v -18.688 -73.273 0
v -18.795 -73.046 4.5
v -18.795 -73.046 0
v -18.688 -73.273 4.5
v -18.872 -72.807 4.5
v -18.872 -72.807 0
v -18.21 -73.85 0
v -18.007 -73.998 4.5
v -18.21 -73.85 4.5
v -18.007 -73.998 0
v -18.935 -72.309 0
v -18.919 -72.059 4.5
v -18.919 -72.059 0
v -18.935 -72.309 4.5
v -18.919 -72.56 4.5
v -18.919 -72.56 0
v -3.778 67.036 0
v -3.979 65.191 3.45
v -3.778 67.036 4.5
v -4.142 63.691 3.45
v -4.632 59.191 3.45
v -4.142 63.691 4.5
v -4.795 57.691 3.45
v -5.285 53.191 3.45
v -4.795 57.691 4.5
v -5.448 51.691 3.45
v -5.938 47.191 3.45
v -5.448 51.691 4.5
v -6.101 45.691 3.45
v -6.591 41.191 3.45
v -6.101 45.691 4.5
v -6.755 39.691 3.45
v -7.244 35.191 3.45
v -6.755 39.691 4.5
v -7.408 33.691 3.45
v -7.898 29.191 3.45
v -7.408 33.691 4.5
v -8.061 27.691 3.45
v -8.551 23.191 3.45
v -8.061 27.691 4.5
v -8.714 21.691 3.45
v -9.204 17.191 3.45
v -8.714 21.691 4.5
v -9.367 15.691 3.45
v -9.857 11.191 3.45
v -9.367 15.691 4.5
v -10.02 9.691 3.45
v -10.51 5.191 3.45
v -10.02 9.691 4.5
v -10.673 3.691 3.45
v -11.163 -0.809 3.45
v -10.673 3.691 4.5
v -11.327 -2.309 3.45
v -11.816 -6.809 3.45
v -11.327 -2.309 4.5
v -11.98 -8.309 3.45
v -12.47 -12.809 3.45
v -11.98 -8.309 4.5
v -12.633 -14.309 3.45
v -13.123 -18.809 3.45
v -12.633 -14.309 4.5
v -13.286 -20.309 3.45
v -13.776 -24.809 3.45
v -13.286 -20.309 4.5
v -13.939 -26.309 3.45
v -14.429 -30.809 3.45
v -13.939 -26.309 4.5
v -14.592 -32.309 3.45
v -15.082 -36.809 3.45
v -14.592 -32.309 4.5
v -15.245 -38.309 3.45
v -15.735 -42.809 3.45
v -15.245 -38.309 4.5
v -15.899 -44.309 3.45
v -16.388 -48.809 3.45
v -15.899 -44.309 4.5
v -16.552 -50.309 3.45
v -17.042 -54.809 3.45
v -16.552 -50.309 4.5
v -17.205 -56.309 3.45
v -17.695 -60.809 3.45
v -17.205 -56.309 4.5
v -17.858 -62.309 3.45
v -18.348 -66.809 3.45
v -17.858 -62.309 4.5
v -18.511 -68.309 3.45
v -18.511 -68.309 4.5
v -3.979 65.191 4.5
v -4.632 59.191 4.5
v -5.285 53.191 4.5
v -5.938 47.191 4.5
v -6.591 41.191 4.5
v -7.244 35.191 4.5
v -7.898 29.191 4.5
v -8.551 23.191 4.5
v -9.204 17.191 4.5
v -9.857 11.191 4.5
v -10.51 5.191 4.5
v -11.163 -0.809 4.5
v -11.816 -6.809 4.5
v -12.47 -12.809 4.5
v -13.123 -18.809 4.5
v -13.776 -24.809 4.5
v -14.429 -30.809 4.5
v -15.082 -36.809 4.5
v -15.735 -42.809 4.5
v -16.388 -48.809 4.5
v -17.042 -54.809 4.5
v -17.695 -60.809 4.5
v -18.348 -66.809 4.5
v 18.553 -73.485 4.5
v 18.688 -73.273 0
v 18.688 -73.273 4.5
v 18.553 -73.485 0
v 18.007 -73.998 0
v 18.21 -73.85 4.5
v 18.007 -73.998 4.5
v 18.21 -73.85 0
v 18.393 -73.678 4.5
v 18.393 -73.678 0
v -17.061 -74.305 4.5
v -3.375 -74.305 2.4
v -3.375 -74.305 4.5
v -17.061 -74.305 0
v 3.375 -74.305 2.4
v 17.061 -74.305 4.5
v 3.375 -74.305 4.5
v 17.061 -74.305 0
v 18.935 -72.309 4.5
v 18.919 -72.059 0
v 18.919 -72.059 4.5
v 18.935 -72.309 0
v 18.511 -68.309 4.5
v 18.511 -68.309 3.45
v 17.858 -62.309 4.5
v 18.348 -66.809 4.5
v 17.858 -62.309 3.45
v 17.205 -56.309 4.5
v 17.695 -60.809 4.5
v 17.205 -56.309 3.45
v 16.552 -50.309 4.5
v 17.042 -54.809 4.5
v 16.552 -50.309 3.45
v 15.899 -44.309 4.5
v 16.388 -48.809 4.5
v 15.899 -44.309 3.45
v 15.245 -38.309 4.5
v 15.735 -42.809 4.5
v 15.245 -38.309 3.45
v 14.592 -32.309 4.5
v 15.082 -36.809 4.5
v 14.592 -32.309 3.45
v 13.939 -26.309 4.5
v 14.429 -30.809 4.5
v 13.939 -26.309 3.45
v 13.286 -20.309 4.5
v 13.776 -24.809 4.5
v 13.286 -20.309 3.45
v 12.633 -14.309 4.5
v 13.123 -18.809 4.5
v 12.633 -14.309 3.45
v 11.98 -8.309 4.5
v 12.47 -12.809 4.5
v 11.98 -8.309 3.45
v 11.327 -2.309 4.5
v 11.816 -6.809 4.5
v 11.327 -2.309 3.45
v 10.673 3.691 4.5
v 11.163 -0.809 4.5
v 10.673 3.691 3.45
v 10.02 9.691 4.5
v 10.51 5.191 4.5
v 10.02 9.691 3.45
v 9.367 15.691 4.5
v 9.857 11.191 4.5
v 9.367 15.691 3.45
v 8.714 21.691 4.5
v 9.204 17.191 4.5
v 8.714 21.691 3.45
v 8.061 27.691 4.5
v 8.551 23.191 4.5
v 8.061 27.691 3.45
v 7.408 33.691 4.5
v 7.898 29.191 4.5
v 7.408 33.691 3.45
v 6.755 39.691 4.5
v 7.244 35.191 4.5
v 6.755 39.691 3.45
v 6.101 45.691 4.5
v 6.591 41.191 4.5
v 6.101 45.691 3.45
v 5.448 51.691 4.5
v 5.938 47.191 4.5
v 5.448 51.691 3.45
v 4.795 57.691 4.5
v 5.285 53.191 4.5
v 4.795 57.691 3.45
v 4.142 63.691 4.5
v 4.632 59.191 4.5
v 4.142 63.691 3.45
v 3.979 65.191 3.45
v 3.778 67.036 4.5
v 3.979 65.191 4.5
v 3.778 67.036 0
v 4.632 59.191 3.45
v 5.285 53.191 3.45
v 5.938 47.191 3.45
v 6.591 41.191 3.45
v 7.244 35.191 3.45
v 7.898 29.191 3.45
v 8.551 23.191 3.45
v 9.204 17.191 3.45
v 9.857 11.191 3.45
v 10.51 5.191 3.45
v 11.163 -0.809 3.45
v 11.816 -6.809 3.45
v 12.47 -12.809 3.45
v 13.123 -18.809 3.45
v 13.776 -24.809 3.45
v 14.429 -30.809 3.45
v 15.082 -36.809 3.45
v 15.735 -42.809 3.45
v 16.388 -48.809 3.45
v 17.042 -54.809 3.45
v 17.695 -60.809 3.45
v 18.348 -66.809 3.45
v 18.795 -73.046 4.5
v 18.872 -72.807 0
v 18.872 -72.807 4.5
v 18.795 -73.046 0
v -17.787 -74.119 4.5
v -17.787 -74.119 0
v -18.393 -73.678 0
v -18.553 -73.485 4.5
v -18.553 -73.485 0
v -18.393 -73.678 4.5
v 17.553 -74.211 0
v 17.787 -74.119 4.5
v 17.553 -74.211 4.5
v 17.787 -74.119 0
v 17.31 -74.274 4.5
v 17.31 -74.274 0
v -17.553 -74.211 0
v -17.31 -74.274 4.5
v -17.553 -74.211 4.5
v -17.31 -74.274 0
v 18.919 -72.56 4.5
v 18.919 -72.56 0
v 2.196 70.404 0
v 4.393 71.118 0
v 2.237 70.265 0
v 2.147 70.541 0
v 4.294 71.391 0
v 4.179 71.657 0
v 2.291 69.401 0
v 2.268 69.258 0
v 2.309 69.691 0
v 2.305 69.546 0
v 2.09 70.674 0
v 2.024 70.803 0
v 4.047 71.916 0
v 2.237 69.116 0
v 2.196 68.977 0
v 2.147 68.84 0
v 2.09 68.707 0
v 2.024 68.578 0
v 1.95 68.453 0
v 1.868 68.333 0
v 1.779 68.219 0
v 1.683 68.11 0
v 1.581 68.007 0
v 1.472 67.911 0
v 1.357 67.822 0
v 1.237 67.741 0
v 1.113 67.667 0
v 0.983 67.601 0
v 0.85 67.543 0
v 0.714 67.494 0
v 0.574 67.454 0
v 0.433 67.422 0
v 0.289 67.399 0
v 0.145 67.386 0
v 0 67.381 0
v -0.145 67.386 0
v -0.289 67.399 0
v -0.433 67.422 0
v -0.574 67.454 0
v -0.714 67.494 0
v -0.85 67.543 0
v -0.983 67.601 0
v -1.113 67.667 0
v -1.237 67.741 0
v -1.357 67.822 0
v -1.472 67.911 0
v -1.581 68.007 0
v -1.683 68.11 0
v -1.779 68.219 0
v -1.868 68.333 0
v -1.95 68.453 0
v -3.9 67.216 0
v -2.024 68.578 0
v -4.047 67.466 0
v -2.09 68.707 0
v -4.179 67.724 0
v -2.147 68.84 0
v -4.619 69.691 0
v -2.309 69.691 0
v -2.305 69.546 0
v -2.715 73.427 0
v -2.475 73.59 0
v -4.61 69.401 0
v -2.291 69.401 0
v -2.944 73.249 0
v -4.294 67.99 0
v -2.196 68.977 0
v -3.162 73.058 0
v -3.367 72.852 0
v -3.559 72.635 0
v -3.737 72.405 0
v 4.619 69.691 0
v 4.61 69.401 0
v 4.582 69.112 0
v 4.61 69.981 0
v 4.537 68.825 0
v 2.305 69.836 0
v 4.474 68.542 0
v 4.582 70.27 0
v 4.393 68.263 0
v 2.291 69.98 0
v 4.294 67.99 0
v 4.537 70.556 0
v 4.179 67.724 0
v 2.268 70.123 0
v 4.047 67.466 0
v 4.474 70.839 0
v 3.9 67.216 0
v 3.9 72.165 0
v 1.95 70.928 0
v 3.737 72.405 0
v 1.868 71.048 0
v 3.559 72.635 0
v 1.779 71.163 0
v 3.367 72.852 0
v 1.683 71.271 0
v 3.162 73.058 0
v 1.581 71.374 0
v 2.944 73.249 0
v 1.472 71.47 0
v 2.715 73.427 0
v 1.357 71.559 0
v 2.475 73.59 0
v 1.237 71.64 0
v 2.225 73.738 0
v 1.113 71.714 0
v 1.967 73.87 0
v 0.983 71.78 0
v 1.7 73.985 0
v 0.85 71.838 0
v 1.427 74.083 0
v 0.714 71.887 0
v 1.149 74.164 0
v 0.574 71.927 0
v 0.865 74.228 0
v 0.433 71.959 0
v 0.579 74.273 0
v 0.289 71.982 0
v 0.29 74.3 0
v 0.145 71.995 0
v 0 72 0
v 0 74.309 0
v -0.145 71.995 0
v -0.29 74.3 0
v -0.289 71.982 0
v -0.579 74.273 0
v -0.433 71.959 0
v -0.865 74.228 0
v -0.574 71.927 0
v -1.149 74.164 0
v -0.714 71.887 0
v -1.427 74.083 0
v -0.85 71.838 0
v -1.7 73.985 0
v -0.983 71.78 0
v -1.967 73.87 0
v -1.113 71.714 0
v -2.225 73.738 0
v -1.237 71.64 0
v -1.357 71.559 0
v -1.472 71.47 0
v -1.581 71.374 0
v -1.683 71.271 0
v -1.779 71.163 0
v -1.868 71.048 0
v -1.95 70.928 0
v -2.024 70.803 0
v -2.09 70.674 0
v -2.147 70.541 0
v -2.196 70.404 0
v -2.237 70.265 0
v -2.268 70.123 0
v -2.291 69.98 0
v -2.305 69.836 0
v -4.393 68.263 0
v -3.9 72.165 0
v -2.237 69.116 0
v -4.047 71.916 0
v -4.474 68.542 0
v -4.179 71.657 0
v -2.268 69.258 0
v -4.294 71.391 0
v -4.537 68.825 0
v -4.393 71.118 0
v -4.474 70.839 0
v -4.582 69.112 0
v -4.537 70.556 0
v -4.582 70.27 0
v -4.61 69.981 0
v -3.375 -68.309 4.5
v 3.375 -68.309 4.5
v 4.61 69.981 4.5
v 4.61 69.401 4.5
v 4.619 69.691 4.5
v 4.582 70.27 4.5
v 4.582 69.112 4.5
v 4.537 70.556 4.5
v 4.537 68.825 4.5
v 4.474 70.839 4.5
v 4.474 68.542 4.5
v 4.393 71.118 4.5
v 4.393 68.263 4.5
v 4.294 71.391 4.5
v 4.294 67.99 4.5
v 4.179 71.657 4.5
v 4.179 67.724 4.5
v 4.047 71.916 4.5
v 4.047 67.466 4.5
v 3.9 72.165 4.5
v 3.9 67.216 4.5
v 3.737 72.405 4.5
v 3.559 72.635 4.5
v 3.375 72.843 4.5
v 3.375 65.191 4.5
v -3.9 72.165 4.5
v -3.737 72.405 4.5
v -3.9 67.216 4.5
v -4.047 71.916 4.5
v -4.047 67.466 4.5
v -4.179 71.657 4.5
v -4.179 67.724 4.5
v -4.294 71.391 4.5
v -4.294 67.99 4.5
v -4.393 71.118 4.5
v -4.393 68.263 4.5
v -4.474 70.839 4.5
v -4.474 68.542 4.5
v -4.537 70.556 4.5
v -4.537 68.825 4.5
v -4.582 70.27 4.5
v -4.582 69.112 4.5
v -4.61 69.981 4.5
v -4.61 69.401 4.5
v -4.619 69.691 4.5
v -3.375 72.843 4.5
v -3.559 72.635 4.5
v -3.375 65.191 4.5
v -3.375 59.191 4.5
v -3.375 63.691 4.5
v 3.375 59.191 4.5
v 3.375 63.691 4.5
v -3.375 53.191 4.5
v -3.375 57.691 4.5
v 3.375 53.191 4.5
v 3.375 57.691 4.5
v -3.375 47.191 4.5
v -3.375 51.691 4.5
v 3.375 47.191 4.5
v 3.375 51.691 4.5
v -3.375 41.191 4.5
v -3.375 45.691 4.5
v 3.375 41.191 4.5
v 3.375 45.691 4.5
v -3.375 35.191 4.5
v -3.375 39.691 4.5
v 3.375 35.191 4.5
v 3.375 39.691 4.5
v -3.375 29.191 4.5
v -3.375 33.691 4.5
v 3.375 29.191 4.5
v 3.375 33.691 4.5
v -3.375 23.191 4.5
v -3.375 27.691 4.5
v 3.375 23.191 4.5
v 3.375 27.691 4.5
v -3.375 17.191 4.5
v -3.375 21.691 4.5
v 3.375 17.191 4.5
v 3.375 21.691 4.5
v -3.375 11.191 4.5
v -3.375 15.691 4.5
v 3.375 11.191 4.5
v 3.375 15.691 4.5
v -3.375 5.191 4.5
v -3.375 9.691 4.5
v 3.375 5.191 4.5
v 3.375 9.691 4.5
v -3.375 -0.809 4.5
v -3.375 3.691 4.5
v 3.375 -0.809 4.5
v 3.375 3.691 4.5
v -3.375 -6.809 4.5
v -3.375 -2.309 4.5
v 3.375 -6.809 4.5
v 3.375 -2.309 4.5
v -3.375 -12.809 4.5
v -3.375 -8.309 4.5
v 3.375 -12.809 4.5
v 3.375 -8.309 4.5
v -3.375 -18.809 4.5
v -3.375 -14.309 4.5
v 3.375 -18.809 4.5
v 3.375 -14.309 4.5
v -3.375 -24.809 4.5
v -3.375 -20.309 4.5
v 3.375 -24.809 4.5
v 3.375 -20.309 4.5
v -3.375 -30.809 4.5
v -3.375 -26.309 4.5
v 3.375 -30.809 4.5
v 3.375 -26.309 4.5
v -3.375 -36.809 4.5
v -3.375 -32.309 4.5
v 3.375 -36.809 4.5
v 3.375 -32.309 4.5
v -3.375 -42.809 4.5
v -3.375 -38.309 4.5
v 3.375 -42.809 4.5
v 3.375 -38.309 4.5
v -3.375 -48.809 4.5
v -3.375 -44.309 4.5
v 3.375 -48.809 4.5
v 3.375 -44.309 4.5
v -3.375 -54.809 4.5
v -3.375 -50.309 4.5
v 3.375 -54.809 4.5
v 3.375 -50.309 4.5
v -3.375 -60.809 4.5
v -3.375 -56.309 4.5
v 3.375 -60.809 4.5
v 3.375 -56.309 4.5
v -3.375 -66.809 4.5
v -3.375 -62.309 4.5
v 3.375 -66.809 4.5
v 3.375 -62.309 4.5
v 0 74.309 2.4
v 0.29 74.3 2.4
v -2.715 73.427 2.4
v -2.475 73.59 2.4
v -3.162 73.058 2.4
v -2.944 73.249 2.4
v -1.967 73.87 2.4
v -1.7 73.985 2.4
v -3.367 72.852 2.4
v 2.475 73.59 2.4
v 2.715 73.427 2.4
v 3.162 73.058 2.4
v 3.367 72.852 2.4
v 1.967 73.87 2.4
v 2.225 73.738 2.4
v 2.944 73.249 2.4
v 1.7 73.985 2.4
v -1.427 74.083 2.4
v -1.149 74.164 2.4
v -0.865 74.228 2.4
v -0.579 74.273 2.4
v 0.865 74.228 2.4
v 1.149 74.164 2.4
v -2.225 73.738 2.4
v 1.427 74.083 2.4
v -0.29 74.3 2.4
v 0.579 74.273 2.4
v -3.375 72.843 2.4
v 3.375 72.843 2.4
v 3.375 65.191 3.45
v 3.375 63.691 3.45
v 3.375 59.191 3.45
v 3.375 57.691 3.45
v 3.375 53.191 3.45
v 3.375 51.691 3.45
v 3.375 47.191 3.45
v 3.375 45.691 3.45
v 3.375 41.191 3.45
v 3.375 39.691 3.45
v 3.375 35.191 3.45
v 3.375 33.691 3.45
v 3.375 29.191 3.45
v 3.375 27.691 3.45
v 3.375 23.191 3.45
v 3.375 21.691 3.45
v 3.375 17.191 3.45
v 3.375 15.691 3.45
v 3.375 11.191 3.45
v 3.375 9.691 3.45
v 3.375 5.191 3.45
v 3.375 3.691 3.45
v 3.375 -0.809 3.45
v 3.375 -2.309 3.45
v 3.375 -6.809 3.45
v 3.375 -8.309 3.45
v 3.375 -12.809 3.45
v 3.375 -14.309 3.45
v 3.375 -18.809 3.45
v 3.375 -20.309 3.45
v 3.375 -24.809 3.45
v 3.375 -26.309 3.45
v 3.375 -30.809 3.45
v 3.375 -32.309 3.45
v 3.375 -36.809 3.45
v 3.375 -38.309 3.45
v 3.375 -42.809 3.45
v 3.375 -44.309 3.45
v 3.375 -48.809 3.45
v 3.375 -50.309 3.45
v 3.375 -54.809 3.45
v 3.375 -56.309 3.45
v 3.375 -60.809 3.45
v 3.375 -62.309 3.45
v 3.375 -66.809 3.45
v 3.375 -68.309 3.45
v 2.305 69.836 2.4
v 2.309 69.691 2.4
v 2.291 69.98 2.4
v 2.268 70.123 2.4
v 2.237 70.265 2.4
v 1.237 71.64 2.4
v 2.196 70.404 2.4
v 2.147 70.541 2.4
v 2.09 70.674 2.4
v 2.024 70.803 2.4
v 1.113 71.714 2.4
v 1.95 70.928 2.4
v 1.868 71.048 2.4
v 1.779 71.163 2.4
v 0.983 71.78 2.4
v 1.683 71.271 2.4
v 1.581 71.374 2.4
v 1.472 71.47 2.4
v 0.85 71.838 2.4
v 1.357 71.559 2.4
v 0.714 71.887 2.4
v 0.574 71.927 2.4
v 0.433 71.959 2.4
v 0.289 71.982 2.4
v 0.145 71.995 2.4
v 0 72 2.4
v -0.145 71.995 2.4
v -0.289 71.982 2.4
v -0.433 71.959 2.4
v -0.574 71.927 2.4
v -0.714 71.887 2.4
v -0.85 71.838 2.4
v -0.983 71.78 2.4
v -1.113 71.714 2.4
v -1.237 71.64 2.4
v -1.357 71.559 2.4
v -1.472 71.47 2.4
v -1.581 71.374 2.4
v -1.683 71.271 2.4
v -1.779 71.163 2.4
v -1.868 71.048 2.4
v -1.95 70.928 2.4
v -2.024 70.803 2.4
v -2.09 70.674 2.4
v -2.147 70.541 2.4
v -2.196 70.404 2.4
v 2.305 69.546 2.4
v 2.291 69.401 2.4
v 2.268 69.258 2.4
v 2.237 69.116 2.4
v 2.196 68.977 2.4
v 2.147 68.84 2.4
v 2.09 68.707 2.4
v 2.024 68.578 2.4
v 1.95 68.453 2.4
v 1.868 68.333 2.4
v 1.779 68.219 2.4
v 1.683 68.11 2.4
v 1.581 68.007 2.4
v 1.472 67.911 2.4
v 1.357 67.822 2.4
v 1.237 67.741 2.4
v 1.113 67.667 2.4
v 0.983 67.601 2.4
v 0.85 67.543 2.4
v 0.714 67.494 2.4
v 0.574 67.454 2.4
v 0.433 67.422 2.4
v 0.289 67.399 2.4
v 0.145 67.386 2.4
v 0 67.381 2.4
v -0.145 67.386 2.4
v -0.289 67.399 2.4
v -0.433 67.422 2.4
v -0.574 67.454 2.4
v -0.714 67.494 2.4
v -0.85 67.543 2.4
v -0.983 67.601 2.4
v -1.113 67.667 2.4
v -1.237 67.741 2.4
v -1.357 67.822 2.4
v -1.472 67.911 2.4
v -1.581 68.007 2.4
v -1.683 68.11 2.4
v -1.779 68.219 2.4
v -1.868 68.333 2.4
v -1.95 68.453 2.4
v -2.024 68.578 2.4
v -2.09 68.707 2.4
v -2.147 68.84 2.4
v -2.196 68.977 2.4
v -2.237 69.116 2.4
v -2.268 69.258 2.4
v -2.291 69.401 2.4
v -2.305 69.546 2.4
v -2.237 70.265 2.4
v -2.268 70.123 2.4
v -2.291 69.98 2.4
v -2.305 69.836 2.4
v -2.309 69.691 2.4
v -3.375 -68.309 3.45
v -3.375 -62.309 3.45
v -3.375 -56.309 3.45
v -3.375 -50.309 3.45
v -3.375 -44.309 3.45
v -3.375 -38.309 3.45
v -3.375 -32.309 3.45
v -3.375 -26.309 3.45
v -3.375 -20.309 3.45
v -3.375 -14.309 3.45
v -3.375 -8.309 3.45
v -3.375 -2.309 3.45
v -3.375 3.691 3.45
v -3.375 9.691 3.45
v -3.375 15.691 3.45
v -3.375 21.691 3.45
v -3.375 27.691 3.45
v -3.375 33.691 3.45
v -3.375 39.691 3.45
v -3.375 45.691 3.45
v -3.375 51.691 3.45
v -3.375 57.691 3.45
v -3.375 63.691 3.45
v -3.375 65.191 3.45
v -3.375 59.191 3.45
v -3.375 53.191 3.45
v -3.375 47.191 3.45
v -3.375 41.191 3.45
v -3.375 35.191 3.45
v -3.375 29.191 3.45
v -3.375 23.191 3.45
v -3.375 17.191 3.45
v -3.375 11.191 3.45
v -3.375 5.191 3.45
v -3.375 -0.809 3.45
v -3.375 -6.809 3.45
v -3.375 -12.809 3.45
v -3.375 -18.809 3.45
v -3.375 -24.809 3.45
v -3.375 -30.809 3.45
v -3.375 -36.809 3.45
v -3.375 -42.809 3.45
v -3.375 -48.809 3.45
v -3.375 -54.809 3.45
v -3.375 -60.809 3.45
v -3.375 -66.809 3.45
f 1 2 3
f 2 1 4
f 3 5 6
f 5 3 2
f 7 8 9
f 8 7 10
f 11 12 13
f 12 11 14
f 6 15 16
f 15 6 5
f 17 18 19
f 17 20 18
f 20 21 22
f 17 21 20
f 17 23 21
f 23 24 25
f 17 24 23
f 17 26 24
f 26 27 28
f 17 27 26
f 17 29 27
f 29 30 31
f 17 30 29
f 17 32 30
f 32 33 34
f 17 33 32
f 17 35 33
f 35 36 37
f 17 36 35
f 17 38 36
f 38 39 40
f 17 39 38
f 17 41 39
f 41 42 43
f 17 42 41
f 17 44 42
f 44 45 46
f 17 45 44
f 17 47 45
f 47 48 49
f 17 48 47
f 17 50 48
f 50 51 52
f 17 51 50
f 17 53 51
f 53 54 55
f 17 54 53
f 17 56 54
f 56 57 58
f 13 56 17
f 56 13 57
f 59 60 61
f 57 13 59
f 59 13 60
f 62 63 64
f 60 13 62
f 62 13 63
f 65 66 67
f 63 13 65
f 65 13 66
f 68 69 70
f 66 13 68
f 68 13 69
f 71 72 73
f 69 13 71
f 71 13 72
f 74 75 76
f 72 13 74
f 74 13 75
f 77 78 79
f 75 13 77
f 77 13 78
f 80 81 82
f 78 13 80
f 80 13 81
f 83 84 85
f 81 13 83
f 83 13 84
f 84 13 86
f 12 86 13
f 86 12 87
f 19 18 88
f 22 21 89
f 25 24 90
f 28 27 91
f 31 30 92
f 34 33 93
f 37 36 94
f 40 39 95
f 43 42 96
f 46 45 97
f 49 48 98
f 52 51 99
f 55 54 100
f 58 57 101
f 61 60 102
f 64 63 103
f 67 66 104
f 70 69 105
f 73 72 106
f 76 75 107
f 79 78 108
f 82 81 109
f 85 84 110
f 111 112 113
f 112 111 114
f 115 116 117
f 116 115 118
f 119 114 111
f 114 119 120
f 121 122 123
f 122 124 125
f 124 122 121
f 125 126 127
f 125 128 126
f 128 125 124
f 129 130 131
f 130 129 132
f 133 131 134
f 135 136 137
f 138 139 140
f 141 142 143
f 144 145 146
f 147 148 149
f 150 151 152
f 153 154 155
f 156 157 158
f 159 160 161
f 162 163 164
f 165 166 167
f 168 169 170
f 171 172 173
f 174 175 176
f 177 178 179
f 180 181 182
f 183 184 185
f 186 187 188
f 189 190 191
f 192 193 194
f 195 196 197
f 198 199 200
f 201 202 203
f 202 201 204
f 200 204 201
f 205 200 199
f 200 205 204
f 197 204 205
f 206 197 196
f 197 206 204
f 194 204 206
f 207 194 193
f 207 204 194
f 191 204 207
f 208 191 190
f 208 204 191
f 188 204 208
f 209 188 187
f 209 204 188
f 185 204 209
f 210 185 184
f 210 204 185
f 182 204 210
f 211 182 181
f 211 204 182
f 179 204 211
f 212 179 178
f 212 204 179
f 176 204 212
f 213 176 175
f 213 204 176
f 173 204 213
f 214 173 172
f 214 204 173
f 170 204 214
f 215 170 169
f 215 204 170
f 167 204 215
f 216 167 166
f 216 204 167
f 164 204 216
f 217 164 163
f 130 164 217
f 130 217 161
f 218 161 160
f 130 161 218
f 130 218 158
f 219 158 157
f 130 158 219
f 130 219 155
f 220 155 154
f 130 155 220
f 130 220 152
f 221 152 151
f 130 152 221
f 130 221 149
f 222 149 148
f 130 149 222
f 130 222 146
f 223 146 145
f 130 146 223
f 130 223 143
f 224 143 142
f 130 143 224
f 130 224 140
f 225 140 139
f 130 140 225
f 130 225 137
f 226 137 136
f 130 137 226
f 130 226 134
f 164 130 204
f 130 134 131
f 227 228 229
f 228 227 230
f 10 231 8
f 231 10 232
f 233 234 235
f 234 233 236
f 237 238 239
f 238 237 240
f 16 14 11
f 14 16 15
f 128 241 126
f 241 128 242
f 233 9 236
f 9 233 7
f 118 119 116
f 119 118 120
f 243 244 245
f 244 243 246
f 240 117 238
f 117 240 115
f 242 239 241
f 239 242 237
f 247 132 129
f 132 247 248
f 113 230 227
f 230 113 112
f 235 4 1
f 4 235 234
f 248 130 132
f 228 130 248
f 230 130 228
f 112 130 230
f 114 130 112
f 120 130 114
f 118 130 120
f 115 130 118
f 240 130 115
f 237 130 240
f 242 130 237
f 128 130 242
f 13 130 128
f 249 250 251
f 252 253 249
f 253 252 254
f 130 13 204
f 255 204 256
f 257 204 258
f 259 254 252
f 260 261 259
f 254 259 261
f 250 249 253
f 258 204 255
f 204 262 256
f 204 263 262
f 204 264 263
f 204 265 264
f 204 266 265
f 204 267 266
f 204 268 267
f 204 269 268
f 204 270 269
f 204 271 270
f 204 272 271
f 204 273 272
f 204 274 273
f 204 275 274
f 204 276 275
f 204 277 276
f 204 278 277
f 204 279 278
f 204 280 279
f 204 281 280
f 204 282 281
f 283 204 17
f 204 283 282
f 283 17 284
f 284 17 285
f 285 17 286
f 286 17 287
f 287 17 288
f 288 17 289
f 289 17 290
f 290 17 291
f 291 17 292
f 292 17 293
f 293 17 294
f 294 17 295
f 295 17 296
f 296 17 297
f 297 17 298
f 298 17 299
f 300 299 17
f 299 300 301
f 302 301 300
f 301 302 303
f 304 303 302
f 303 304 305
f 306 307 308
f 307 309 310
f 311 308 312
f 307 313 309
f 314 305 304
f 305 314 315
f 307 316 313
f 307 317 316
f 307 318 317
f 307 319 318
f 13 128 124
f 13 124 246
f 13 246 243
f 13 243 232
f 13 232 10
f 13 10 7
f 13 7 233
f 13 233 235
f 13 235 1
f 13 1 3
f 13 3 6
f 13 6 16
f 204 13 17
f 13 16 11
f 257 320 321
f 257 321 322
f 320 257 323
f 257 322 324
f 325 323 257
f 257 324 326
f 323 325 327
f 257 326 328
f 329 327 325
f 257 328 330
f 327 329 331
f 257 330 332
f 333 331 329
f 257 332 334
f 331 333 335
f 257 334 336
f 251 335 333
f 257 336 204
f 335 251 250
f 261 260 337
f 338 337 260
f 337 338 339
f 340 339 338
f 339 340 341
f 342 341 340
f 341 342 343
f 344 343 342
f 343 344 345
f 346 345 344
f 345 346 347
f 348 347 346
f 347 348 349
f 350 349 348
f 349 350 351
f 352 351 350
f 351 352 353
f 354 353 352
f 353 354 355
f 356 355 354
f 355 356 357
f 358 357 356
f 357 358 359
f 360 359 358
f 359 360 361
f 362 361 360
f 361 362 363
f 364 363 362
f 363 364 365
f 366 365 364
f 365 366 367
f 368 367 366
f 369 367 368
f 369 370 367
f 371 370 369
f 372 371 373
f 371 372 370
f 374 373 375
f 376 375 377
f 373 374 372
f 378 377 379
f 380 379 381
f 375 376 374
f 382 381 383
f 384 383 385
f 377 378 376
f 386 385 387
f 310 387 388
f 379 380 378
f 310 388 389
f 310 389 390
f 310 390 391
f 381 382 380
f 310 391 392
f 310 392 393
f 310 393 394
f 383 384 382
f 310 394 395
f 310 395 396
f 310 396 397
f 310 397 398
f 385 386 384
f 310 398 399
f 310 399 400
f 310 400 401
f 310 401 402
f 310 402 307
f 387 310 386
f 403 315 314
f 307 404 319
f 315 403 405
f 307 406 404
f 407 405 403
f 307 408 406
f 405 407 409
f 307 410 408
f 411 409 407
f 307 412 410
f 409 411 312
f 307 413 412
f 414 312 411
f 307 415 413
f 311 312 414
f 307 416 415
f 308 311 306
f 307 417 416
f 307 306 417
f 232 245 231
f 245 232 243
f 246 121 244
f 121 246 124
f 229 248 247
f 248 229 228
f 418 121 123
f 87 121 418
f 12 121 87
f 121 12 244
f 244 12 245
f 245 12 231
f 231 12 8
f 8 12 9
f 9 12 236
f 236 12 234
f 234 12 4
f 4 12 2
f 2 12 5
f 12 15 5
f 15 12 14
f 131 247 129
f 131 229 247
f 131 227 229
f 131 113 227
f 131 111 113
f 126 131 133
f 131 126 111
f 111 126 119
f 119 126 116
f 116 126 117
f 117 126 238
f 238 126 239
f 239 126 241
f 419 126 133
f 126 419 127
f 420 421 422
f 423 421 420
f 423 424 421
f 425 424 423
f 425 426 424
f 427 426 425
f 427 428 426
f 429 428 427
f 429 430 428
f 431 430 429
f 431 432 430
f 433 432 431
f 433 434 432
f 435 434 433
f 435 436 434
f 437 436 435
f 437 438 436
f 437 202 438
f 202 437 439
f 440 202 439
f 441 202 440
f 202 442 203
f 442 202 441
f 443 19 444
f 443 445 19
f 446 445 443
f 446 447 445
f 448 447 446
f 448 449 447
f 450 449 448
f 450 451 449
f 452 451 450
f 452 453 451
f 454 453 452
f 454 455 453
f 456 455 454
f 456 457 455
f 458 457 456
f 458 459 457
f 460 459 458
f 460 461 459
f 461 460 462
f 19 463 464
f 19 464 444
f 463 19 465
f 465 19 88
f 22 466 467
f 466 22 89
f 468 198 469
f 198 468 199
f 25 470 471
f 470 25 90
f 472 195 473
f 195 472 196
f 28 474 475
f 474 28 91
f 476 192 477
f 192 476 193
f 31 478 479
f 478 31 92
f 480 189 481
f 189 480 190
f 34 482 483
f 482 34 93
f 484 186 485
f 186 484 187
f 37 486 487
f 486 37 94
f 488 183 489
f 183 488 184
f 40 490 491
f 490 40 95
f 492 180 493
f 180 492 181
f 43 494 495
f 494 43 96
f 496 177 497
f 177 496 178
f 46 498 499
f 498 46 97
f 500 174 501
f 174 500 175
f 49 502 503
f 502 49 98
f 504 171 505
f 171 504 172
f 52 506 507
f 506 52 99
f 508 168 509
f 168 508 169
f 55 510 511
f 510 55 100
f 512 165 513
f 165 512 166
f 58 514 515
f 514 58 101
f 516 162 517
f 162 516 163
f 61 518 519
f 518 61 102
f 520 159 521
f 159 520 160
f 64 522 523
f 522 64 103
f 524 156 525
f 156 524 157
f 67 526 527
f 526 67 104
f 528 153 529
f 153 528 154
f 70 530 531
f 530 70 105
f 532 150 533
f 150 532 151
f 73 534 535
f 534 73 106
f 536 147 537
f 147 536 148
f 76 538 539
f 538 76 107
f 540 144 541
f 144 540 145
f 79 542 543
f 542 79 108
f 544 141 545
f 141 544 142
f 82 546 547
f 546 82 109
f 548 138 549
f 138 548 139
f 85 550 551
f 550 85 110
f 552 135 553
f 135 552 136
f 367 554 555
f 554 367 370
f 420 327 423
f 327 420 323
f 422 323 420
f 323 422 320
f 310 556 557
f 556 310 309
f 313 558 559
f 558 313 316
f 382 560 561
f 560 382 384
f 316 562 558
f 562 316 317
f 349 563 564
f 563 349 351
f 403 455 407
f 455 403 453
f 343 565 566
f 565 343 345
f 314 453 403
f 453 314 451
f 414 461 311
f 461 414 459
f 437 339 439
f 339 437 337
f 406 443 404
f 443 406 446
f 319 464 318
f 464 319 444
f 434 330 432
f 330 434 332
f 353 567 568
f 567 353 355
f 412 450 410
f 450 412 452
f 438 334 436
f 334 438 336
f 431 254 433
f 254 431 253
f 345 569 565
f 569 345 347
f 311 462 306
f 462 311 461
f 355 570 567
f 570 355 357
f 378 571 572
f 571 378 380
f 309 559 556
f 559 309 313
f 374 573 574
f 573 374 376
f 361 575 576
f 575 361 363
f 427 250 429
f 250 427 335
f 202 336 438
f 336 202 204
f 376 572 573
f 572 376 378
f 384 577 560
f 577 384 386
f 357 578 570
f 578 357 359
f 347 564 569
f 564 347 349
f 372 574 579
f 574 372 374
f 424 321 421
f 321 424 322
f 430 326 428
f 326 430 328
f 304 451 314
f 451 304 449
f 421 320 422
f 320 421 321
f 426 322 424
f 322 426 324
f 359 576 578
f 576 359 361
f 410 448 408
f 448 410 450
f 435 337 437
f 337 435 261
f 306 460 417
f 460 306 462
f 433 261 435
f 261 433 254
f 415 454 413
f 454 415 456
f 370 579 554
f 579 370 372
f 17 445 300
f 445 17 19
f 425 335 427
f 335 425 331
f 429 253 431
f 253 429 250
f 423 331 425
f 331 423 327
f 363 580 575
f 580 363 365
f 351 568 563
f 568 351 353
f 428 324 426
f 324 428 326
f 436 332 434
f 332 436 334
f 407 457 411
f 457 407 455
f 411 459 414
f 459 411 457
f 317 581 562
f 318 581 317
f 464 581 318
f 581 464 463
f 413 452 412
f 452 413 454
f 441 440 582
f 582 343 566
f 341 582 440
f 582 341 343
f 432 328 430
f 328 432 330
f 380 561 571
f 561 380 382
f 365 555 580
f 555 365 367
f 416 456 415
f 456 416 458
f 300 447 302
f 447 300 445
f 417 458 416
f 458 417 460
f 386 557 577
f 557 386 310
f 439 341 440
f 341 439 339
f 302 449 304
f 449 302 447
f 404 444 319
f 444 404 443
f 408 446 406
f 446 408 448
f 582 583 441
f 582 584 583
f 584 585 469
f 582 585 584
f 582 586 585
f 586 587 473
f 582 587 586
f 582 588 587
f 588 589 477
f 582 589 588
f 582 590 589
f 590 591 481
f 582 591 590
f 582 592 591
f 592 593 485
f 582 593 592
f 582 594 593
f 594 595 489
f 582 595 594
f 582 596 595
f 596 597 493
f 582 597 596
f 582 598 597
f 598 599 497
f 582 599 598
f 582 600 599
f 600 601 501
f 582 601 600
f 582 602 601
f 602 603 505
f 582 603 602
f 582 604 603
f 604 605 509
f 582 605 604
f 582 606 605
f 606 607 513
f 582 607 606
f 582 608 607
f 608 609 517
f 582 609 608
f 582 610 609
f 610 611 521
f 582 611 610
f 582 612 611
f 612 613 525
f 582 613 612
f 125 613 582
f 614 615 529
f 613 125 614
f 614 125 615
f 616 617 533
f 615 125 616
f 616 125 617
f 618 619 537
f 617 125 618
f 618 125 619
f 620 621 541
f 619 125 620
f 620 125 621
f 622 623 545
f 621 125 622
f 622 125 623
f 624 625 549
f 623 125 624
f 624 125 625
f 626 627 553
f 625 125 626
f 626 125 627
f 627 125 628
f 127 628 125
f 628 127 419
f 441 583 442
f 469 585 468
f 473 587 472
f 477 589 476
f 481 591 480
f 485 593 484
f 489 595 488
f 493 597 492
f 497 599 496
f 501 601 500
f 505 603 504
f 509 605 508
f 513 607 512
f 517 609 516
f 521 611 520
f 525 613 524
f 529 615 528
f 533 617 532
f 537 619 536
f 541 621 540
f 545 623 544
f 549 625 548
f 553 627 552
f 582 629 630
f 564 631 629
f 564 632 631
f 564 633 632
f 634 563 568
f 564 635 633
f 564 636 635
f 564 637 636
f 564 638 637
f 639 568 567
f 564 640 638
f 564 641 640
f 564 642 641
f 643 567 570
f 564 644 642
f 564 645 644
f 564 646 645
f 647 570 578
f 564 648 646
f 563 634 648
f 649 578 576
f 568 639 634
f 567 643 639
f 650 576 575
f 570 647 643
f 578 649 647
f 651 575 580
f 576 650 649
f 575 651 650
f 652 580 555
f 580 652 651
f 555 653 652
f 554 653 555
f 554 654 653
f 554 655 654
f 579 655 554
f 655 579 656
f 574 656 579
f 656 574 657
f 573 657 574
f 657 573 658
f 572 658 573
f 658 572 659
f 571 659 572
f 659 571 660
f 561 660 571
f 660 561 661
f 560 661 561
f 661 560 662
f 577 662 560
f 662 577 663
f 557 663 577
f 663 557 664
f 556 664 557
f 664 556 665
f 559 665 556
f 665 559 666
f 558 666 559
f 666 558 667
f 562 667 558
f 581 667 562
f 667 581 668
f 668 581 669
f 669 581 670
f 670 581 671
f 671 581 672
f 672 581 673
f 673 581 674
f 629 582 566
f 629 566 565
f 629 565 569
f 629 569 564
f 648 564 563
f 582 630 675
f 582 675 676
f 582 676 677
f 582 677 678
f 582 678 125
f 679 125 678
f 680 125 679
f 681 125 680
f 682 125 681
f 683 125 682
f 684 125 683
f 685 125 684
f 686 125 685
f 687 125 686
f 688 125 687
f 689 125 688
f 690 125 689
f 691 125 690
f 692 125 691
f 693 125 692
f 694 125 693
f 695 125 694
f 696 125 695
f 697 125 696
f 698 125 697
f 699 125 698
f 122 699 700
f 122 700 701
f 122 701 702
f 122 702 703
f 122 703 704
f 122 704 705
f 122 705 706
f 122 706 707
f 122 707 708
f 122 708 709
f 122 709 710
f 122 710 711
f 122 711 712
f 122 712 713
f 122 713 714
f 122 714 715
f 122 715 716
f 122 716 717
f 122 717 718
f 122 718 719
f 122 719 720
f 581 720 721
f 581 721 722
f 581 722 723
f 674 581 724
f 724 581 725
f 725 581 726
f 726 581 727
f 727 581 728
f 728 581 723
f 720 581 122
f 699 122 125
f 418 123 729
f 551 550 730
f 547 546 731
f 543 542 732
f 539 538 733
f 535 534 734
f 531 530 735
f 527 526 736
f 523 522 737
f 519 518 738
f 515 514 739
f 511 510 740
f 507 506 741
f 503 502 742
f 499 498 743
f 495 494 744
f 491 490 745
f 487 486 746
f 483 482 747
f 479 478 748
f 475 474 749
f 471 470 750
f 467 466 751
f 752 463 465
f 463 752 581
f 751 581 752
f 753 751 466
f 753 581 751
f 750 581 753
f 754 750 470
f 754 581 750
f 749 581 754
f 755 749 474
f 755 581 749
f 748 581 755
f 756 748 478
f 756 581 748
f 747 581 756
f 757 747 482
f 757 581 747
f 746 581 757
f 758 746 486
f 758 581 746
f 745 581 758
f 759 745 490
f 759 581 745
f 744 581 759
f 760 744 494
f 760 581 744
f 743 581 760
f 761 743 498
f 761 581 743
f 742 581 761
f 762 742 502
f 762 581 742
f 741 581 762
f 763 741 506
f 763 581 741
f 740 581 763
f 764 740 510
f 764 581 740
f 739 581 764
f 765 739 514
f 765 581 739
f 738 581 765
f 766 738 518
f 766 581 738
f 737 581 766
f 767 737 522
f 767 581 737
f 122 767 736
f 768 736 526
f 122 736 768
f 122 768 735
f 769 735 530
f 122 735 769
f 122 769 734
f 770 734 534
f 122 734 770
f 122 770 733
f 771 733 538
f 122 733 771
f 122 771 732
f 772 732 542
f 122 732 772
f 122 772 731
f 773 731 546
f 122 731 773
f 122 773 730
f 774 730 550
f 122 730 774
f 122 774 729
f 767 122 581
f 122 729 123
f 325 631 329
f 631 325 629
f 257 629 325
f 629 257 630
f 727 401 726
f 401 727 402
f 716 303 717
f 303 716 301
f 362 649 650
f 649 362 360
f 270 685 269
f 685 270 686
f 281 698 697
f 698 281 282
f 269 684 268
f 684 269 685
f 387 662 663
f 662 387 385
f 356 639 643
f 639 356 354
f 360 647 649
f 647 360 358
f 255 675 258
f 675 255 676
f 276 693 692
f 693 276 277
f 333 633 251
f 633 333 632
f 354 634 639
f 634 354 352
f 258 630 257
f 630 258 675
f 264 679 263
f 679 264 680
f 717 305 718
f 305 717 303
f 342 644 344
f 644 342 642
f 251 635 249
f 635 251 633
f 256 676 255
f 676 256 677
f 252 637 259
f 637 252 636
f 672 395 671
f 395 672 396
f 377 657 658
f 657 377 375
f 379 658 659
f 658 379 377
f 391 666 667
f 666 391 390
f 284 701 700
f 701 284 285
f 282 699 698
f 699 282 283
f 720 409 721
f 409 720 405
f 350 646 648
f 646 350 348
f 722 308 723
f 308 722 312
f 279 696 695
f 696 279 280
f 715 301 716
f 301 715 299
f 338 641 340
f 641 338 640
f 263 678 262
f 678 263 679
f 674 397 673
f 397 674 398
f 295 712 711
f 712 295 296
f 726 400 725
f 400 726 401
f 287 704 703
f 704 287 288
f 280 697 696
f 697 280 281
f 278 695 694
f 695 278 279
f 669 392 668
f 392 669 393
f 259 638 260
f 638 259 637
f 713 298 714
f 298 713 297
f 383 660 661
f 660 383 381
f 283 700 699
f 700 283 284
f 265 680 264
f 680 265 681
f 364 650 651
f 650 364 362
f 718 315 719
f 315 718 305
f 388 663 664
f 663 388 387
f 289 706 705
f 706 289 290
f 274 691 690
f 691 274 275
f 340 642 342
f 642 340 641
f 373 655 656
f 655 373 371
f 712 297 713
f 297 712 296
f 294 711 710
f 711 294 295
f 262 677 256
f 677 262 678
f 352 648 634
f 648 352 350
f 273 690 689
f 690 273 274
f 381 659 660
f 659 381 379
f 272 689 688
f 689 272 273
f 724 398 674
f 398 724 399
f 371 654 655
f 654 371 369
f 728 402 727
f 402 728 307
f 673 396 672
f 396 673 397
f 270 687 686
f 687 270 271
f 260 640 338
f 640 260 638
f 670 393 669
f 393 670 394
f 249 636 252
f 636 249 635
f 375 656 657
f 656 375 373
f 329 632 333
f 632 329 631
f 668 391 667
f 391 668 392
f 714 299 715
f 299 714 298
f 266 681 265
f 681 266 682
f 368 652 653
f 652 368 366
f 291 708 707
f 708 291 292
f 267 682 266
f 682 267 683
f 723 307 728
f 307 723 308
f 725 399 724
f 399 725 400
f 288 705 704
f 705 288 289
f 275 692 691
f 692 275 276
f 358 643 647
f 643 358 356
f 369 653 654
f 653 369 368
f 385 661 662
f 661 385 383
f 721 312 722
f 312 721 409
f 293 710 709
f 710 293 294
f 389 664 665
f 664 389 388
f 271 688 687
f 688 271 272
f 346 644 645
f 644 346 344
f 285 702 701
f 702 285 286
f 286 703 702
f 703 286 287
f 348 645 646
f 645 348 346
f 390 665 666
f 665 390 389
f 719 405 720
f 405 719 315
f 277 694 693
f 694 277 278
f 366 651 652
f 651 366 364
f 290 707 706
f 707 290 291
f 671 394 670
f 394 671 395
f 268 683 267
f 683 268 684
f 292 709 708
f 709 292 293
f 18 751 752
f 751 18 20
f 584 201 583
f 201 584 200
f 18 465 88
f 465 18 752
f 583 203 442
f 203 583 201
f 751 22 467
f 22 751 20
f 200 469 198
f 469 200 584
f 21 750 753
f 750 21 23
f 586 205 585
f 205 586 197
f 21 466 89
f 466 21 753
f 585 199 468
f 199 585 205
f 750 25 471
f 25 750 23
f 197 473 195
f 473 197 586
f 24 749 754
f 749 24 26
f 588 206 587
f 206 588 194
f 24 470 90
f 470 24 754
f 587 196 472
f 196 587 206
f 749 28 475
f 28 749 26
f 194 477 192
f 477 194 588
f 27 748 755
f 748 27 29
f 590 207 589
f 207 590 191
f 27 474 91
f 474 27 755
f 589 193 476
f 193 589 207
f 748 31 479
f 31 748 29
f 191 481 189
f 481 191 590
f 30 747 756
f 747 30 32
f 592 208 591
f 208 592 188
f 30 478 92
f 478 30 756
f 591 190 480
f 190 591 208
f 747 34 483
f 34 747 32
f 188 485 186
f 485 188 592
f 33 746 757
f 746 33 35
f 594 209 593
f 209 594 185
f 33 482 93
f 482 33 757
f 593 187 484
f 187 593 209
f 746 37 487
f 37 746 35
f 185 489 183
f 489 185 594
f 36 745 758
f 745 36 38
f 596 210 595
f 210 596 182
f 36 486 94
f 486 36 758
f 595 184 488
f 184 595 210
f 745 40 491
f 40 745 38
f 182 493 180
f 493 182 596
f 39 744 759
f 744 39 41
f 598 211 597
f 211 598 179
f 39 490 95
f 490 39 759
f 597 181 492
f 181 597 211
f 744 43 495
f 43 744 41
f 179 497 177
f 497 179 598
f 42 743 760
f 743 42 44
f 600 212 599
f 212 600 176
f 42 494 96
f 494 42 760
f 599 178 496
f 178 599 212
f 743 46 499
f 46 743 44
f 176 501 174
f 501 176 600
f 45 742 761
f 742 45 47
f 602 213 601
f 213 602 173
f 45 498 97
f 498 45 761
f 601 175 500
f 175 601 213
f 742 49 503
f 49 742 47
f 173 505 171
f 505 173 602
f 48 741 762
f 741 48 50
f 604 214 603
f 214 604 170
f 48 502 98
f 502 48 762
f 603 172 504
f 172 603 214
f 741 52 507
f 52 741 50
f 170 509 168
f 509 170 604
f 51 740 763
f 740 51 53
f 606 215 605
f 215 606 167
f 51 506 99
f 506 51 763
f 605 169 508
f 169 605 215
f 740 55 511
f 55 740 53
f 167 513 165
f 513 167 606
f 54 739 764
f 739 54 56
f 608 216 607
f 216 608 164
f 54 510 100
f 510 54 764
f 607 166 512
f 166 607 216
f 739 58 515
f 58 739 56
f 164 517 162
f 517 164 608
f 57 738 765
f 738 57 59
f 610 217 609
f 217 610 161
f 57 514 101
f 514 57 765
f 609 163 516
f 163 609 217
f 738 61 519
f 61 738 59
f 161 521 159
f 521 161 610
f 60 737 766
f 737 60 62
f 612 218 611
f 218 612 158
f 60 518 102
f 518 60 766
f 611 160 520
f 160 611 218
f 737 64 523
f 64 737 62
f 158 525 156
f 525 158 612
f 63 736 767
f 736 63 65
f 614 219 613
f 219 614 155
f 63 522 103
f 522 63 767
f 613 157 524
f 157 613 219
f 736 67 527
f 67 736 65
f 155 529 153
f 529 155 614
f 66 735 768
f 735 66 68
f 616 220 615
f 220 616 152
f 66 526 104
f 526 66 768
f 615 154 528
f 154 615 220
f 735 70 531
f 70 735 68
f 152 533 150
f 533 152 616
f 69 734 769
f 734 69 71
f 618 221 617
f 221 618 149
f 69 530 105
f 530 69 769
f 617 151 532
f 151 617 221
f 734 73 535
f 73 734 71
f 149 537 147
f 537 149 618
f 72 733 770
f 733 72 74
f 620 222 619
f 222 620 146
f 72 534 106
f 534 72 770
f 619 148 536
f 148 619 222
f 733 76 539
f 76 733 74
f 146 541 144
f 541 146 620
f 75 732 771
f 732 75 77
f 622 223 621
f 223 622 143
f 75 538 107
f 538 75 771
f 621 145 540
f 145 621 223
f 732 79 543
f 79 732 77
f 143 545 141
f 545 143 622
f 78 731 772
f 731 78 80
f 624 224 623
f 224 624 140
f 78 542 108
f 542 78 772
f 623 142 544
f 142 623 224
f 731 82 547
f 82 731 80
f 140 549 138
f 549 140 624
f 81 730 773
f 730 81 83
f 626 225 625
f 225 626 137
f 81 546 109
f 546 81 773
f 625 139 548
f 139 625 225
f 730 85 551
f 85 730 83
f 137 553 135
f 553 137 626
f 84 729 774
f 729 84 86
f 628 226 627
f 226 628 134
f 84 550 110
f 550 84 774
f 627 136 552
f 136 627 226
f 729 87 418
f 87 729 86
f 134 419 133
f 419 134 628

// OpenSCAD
// Generate a resistor/diode lead bending tool
// Dan Newman, dan dot newman @ mtbaldy dot us
// 30 June 2012

// Slicing layer height
layer_height = 0.3;

// spacing between each position
spacing = 6.0;

// Diameter of resistor leads
wire_d = 1.50;

// ---------------------
// Short/small resistors

// First bending width
start_w = 0.4 * 25.4;  // Imperial

// Final bending width
// end_w = 1.0 * 25.4;
end_w = 1.5 * 25.4; // Nice long bender, but too long for a 10 x 10 cm build area

// Steps between each bending width
step_w = 0.05 * 25.4;

// Width and depth of the trough/ditch to place the resistors in
trough_w = 6.75;
trough_d = 2.10;

// -----------------------
// Medium sized resistors

// First bending width
//start_w = 0.6 * 25.4;  // Imperial

// Final bending width
//end_w = 1.0 * 25.4;
//end_w = 1.5 * 25.4; // Nice long bender, but too long for a 10 x 10 cm build area

// Steps between each bending width
//step_w  = 0.05 * 25.4;

// Width and depth of the trough/ditch to place the resistors in
//trough_w = 10.5;
//trough_d = 3.00;

// -------------
// Miscellaneous

// Corner radius for corners of the plate
corner_r = 2.0;


// -----------------------
// Derived values follow

// Thickness of the tool
thickness = 2 * trough_d;

// Round up to the nearest multiple of a layer height
H = thickness + layer_height*(1.0+floor(thickness/layer_height)-(thickness/layer_height));

// Number of positions
N = ceil( 1 + ( end_w - start_w ) / step_w );

// Starting and ending slot widths with allowances for the wire diameters
W_1 = start_w - wire_d;
W_N = end_w   - wire_d;

// To determine the actual starting and ending widths, consider the
// line segment drawn between the first slot of width W_1 and the final
// slot of width W_N and spaced (N-1)*spacing away.
P1 = [W_1 / 2, (N - 1)*spacing];
P2 = [W_N / 2, 0];

// We wish to find the X coordinates X0 and X3 of the points
//
//   P0 = [X0, N * spacing]
//   P3 = [X3, -spacing]
//
// on the line through P1 & P2.  The equation of the line as a function of y is
//
//   L(y) = P2[0] + y * ( P1[0] - P2[0] ) / ( P1[1] - P2[1] ) 
P0 = [P2[0] + N * spacing * ( P1[0] - P2[0] ) / ( P1[1] - P2[1] ), N * spacing];
P3 = [P2[0] - spacing * ( P1[0] - P2[0] ) / ( P1[1] - P2[1] ), -spacing];

// Overall length (we use for centering the piece)
L = P0[1] - P3[1] + P0[0] * 1.25;

module plate()
{
    difference()
    {
        union()
        {
            hull()
            {
                 translate([P0[0] - corner_r, P0[1] - corner_r, 0])
                     cylinder(h=H, r=corner_r, center=false, $fn=50);
                 translate([-P0[0] + corner_r, P0[1] - corner_r, 0])
                     cylinder(h=H, r=corner_r, center=false, $fn=50);
                 translate([P3[0] - corner_r, P3[1] + corner_r, 0])
                     cylinder(h=H, r=corner_r, center=false, $fn=50);
                 translate([-P3[0] + corner_r, P3[1] + corner_r, 0])
                     cylinder(h=H, r=corner_r, center=false, $fn=50);
            }
            translate([0, P0[1], 0])
                 cylinder(h=H, r=P0[0]*1.25, center=false, $fn=100);
        }
        translate([-trough_w/2, -2*spacing, H - trough_d])
            cube([trough_w, (N + 4) * spacing, H]);
        translate([0, P0[1], -(H+1)/2])
            cylinder(h=H+1, r=P0[0]*1.25/2, center=false, $fn=100);
    }
}

module slot(n)
{
	translate([-P3[0], P1[1] - n*spacing, H - trough_d/2])
      cube([P3[0]*2, wire_d, H]);
}

translate([0, -(L/2 + P3[1]), 0]) difference()
{
    plate();
    for (n = [0 : N-1])
    {
        slot(n);
    }
}
